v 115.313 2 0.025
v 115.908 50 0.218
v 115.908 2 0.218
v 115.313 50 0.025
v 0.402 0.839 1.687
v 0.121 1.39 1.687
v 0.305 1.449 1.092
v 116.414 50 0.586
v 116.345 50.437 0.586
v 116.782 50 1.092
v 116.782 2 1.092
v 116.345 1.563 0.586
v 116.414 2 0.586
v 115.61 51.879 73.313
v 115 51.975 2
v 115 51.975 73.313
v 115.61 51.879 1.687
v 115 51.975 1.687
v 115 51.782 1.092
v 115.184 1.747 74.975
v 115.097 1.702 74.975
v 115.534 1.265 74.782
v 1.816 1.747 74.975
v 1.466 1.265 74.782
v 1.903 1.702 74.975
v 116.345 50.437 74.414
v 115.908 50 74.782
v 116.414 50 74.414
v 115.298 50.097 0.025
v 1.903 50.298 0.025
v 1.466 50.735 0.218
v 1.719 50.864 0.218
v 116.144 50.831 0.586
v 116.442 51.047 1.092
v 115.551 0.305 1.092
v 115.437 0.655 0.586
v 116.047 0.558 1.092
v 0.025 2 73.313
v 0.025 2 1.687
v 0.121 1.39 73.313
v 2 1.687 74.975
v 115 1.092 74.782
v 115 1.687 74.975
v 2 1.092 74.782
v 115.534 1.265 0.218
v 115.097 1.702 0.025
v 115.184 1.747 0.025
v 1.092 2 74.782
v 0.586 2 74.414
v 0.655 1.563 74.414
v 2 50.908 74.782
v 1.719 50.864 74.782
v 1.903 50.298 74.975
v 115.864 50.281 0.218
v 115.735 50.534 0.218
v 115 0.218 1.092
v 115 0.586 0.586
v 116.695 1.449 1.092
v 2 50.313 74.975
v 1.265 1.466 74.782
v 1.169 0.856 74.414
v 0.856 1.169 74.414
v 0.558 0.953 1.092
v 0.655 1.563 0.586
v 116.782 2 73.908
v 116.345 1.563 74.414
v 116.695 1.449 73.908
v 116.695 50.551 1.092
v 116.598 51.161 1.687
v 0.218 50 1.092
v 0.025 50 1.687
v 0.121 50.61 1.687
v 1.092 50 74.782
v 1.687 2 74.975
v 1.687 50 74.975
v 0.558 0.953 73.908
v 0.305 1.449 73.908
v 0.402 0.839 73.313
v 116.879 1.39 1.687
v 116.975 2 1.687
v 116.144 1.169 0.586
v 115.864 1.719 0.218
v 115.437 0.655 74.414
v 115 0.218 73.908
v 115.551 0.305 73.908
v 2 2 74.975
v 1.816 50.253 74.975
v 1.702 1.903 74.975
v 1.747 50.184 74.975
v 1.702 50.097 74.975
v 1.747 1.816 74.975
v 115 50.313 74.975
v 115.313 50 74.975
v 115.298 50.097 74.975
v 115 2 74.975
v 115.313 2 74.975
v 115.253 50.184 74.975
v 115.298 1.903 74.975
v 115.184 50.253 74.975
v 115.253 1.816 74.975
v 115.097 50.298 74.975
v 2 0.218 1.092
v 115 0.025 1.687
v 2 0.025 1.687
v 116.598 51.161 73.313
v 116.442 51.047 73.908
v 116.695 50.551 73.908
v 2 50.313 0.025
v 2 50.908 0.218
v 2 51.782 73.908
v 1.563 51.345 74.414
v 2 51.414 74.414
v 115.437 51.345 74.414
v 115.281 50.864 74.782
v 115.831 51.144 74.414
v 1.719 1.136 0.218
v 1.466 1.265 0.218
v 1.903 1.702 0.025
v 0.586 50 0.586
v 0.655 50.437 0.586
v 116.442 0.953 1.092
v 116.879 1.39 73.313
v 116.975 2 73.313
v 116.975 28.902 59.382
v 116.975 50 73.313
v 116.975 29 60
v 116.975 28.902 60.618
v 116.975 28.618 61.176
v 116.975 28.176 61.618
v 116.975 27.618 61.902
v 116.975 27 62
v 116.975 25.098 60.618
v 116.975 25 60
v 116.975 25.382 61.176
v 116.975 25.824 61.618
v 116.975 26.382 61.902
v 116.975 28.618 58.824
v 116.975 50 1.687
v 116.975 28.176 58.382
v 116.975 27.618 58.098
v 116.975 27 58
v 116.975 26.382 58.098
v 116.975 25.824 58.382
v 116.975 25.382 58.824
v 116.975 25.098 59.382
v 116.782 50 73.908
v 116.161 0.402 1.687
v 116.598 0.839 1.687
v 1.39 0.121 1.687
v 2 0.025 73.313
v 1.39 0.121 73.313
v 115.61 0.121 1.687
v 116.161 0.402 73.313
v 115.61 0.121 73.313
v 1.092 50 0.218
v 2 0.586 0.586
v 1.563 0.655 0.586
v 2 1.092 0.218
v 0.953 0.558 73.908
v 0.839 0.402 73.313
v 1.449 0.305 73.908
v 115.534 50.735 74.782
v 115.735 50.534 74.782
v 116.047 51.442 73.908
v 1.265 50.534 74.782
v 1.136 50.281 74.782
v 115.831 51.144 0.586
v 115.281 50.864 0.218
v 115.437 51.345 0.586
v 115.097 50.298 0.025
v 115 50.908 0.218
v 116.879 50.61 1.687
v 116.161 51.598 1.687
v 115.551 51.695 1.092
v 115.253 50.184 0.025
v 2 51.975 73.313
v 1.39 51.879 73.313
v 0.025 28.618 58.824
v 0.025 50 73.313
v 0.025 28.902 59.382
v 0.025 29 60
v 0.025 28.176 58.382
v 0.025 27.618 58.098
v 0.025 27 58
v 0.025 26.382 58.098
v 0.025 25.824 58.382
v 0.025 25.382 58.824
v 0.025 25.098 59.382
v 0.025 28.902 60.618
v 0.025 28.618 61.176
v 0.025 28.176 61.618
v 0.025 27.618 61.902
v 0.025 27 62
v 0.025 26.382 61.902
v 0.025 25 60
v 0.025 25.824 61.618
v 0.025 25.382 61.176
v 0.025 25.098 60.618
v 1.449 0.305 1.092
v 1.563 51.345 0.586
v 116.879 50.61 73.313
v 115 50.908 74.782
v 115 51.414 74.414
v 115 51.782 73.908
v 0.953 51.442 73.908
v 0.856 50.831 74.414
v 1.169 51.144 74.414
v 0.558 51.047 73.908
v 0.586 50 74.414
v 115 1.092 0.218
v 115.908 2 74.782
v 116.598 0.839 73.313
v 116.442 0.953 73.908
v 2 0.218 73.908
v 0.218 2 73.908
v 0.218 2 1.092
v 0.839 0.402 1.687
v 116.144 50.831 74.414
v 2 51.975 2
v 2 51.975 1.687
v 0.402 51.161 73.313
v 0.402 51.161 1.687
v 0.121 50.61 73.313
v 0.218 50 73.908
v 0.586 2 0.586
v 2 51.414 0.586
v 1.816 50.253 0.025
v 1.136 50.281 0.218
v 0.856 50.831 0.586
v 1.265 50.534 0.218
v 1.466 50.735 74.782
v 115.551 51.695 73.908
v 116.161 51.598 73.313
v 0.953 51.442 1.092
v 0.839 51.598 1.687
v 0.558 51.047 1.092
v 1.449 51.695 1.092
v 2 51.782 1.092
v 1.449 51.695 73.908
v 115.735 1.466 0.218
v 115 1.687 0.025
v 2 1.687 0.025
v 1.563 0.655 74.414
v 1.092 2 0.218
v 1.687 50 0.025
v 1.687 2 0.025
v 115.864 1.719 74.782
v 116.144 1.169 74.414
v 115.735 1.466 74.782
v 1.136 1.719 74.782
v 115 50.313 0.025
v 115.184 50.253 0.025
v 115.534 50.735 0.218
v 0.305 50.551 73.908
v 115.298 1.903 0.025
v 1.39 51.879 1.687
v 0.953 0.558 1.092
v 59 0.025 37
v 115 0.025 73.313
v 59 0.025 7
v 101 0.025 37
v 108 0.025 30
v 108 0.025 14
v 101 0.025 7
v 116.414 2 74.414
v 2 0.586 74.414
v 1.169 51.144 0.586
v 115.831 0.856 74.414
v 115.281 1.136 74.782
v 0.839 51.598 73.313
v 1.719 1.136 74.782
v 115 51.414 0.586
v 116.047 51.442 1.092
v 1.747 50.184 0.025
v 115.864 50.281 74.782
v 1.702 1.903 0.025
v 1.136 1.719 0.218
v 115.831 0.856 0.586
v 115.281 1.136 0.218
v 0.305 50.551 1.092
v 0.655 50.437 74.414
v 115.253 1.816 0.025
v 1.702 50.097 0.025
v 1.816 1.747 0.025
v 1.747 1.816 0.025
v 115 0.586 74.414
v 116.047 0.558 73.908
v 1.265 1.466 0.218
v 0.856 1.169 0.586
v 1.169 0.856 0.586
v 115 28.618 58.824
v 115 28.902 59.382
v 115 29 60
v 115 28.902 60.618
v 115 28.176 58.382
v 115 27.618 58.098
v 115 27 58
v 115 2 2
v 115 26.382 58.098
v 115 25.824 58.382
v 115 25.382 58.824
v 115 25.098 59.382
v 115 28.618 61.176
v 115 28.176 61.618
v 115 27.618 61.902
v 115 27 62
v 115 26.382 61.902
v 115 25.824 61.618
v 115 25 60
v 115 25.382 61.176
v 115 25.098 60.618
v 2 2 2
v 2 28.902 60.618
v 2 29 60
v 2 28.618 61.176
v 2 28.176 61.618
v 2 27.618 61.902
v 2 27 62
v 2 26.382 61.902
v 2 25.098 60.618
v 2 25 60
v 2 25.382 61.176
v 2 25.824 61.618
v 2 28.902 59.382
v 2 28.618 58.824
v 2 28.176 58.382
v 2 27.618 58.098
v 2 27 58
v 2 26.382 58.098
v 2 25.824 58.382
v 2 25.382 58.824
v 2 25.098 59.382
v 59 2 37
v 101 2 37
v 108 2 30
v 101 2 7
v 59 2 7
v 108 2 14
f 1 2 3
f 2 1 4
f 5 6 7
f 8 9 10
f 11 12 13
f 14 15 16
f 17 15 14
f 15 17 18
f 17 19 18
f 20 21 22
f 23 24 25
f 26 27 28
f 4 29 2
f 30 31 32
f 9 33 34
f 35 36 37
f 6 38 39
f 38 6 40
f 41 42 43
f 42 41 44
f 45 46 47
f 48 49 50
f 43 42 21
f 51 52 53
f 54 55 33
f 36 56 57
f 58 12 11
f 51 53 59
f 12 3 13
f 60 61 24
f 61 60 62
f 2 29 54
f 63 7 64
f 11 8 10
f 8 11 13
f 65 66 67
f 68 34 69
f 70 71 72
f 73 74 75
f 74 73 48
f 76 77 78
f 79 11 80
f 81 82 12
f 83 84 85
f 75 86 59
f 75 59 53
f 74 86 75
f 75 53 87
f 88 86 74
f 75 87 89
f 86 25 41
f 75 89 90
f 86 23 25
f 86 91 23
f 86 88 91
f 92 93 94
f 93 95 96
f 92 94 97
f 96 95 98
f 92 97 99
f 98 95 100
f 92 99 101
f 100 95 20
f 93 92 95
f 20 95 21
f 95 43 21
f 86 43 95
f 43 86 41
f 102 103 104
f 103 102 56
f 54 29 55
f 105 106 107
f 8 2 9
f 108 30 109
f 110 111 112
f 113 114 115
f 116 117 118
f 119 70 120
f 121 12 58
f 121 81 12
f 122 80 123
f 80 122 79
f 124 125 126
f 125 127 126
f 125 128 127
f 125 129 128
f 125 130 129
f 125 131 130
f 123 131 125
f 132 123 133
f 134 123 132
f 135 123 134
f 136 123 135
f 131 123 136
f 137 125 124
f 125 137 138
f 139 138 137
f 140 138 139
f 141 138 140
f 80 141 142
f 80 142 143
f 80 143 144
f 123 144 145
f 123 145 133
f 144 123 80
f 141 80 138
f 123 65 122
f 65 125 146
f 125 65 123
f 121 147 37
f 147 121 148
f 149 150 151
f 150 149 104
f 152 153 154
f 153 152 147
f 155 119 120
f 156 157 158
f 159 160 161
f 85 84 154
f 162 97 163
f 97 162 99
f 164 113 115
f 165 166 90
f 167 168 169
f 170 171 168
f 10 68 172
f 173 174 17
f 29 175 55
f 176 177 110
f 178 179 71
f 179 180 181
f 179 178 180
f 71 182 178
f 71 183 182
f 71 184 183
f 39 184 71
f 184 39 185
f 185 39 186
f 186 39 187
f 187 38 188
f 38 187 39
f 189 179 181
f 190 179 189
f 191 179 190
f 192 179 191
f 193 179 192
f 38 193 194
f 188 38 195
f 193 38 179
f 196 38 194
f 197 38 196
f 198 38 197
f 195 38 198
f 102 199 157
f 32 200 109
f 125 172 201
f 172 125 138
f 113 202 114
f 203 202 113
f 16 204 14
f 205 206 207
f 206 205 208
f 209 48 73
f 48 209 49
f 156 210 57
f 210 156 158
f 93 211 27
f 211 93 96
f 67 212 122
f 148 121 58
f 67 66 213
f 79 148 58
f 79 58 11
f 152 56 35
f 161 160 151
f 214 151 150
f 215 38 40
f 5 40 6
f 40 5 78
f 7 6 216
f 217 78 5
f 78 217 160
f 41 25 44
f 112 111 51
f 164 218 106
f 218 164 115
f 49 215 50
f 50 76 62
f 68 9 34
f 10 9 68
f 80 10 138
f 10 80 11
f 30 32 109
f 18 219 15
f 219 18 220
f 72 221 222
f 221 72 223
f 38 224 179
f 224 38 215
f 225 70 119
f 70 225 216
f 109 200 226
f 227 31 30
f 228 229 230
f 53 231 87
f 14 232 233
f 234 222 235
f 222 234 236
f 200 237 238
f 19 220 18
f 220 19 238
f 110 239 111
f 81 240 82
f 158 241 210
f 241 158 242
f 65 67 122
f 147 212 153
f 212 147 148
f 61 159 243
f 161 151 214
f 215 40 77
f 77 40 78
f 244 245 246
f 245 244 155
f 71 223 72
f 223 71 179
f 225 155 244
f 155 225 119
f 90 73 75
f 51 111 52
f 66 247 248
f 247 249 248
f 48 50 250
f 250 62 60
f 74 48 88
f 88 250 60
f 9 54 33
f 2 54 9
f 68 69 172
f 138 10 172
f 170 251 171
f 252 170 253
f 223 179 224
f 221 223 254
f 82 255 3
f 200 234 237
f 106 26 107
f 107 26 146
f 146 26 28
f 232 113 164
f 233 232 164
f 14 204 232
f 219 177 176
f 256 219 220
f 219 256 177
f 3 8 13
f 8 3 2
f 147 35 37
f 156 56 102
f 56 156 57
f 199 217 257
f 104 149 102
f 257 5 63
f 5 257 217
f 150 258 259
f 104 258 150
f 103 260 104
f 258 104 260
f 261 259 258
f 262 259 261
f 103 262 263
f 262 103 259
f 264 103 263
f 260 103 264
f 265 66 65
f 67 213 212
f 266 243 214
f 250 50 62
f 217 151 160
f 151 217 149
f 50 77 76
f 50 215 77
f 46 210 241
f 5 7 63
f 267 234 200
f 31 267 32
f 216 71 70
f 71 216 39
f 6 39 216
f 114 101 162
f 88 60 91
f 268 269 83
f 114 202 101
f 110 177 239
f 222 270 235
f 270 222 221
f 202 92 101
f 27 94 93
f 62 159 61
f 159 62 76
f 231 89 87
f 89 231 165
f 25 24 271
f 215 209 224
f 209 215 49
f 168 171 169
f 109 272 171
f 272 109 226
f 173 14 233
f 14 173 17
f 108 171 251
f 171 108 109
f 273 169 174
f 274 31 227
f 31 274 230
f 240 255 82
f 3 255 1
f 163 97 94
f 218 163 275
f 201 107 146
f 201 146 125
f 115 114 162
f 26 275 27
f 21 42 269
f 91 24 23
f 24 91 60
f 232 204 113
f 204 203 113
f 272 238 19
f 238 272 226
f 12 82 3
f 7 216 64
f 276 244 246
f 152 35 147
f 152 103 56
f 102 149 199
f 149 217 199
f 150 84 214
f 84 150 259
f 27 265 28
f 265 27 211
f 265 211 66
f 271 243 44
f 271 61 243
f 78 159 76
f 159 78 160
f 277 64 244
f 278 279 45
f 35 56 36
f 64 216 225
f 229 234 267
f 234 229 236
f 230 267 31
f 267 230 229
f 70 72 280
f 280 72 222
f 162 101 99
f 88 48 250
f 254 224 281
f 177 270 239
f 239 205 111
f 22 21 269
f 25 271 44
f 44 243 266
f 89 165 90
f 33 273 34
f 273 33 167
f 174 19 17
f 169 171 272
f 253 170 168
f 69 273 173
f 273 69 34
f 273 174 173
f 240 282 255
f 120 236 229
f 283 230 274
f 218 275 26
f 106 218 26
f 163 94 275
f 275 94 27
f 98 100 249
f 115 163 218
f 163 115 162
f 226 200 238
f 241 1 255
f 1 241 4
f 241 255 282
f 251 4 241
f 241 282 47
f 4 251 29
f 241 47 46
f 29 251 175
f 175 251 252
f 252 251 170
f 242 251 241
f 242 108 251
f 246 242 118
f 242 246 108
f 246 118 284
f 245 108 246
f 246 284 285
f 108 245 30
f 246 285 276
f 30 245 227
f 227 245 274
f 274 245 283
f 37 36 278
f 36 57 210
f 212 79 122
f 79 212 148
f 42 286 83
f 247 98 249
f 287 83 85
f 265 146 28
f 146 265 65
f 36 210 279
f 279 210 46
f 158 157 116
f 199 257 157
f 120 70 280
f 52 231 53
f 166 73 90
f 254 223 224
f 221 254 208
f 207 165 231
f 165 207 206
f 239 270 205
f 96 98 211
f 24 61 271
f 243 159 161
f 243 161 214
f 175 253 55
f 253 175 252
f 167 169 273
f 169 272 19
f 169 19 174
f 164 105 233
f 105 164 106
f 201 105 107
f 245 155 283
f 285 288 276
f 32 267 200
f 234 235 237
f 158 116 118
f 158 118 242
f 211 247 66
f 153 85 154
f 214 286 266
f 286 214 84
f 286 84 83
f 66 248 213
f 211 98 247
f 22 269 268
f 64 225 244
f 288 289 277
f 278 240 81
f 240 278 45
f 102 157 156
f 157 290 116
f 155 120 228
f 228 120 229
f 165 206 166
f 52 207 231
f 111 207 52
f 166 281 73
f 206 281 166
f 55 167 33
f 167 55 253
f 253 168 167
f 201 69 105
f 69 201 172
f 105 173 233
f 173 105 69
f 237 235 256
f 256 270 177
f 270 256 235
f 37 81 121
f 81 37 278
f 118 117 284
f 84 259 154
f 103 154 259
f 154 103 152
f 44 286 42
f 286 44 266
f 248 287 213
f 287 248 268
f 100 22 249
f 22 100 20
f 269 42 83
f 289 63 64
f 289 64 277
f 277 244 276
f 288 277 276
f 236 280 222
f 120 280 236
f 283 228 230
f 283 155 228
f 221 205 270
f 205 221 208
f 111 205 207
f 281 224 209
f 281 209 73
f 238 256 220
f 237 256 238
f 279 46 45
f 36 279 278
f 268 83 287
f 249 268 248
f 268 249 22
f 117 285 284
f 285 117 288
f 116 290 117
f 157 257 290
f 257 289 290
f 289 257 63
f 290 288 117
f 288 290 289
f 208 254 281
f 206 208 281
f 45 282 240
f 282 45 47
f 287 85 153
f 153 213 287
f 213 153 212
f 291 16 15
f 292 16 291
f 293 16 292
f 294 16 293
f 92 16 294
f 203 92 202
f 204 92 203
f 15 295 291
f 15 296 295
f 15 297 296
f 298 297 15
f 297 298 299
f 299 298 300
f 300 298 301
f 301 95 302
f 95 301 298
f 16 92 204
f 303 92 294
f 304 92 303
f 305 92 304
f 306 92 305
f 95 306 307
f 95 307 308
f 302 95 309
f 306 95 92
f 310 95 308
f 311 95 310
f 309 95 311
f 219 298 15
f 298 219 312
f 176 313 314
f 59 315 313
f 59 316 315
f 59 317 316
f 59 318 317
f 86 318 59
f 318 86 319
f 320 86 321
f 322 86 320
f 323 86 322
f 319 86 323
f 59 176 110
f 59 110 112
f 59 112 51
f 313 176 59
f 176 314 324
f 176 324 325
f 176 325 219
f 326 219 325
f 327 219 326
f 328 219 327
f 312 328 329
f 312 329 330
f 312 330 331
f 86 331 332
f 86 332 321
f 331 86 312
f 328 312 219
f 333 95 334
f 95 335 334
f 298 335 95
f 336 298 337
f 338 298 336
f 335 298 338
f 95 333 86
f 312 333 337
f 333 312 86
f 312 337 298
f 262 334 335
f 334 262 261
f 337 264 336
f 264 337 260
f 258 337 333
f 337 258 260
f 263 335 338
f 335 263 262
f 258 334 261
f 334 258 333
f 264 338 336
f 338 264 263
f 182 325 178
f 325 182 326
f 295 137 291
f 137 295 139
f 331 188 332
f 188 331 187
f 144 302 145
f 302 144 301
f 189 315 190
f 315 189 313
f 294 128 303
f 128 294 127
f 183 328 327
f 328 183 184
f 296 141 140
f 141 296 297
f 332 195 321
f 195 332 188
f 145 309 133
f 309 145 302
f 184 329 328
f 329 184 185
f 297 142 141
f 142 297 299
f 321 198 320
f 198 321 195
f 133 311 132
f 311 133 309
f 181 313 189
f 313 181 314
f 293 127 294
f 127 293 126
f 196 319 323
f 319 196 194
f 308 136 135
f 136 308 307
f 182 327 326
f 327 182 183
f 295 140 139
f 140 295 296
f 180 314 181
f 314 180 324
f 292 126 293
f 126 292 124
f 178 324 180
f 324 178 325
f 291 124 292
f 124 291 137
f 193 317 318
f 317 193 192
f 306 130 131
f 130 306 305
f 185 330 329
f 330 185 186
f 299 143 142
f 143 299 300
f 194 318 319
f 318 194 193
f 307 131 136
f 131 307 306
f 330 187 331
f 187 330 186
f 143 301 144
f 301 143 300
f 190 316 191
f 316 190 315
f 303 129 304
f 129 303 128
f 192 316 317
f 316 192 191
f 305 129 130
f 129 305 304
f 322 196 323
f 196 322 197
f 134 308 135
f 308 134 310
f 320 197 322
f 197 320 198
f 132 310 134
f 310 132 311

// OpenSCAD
/* [Plug Options] */
//The width of the plug, in mm (The long way)
plugWidth=49;
//The height of the plug, in mm (The short way)
plugHeight=30;
//How far the angles on the plug should go, measured along the x axis from the right, in mm
plugChamfer=7;
//At 0, the plug will be in the bottom right corner, but not hitting the chamfer or the interior. This moves the plug left, in mm.
plugXOffset=5;
//Moves the plug up, in mm
plugZOffset=5;

/* [Case Options] */
//The thickness of the case, in mm
thickness=2;
//The width of the interior of the case, in mm
width=113;
//The height of the case, in mm
height=75;
//The interior depth of the case, in mm
depth=50;
//The radius of the fillets (Rounded edges), in mm. Set to 0 for square edges
filletR=2;

/* [Hole] */
//Whether or not to make the hole for a screw.
makeHole="Yes";//[Yes,No]
//The diameter of the hole
holeD=4;
//How high from the bottom of the case to center the hole
holeHeight=60;
//How far from the back of the case to center the hole
holeLocation=25;

/* [Hidden] */
nm=.1;
nm2=2*nm;
holeR=holeD/2;

module roundedCube(size,r,fn=20)
{
    width=size[0];
    depth=size[1];
    height=size[2];
    if(r==0)
        cube(size);
    else
    {
        hull()
        {
            for(x = [r,width-r])
                for(y = [r,depth-r])
                    for(z = [r,height-r])
                        translate([x,y,z])
                            sphere(r=r,$fn=fn);
        }
    }
}

module plug()
{
        hull()
        {
            cube([plugWidth-plugChamfer,plugHeight,thickness+nm2]);
            translate([0,plugChamfer,0])
                cube([plugWidth,plugHeight-2*plugChamfer,thickness+nm2]);
        };
}
difference()
{
    roundedCube([width+2*thickness,depth+thickness,height],filletR,fn=20);
    translate([thickness,thickness,thickness])
        roundedCube([width,depth+thickness,height],max(filletR-thickness,0),fn=20);
    translate([width-max(filletR+thickness)-plugWidth+thickness*2-plugXOffset,nm+thickness,max(filletR,thickness)+plugZOffset])
        rotate([90,0,0])
            plug();
    if(makeHole=="Yes")
        translate([-nm,depth-holeLocation+thickness,holeHeight])
            rotate([0,90,0])
                cylinder(r=holeR,h=width+nm2+2*thickness,$fn=20);
    
}
